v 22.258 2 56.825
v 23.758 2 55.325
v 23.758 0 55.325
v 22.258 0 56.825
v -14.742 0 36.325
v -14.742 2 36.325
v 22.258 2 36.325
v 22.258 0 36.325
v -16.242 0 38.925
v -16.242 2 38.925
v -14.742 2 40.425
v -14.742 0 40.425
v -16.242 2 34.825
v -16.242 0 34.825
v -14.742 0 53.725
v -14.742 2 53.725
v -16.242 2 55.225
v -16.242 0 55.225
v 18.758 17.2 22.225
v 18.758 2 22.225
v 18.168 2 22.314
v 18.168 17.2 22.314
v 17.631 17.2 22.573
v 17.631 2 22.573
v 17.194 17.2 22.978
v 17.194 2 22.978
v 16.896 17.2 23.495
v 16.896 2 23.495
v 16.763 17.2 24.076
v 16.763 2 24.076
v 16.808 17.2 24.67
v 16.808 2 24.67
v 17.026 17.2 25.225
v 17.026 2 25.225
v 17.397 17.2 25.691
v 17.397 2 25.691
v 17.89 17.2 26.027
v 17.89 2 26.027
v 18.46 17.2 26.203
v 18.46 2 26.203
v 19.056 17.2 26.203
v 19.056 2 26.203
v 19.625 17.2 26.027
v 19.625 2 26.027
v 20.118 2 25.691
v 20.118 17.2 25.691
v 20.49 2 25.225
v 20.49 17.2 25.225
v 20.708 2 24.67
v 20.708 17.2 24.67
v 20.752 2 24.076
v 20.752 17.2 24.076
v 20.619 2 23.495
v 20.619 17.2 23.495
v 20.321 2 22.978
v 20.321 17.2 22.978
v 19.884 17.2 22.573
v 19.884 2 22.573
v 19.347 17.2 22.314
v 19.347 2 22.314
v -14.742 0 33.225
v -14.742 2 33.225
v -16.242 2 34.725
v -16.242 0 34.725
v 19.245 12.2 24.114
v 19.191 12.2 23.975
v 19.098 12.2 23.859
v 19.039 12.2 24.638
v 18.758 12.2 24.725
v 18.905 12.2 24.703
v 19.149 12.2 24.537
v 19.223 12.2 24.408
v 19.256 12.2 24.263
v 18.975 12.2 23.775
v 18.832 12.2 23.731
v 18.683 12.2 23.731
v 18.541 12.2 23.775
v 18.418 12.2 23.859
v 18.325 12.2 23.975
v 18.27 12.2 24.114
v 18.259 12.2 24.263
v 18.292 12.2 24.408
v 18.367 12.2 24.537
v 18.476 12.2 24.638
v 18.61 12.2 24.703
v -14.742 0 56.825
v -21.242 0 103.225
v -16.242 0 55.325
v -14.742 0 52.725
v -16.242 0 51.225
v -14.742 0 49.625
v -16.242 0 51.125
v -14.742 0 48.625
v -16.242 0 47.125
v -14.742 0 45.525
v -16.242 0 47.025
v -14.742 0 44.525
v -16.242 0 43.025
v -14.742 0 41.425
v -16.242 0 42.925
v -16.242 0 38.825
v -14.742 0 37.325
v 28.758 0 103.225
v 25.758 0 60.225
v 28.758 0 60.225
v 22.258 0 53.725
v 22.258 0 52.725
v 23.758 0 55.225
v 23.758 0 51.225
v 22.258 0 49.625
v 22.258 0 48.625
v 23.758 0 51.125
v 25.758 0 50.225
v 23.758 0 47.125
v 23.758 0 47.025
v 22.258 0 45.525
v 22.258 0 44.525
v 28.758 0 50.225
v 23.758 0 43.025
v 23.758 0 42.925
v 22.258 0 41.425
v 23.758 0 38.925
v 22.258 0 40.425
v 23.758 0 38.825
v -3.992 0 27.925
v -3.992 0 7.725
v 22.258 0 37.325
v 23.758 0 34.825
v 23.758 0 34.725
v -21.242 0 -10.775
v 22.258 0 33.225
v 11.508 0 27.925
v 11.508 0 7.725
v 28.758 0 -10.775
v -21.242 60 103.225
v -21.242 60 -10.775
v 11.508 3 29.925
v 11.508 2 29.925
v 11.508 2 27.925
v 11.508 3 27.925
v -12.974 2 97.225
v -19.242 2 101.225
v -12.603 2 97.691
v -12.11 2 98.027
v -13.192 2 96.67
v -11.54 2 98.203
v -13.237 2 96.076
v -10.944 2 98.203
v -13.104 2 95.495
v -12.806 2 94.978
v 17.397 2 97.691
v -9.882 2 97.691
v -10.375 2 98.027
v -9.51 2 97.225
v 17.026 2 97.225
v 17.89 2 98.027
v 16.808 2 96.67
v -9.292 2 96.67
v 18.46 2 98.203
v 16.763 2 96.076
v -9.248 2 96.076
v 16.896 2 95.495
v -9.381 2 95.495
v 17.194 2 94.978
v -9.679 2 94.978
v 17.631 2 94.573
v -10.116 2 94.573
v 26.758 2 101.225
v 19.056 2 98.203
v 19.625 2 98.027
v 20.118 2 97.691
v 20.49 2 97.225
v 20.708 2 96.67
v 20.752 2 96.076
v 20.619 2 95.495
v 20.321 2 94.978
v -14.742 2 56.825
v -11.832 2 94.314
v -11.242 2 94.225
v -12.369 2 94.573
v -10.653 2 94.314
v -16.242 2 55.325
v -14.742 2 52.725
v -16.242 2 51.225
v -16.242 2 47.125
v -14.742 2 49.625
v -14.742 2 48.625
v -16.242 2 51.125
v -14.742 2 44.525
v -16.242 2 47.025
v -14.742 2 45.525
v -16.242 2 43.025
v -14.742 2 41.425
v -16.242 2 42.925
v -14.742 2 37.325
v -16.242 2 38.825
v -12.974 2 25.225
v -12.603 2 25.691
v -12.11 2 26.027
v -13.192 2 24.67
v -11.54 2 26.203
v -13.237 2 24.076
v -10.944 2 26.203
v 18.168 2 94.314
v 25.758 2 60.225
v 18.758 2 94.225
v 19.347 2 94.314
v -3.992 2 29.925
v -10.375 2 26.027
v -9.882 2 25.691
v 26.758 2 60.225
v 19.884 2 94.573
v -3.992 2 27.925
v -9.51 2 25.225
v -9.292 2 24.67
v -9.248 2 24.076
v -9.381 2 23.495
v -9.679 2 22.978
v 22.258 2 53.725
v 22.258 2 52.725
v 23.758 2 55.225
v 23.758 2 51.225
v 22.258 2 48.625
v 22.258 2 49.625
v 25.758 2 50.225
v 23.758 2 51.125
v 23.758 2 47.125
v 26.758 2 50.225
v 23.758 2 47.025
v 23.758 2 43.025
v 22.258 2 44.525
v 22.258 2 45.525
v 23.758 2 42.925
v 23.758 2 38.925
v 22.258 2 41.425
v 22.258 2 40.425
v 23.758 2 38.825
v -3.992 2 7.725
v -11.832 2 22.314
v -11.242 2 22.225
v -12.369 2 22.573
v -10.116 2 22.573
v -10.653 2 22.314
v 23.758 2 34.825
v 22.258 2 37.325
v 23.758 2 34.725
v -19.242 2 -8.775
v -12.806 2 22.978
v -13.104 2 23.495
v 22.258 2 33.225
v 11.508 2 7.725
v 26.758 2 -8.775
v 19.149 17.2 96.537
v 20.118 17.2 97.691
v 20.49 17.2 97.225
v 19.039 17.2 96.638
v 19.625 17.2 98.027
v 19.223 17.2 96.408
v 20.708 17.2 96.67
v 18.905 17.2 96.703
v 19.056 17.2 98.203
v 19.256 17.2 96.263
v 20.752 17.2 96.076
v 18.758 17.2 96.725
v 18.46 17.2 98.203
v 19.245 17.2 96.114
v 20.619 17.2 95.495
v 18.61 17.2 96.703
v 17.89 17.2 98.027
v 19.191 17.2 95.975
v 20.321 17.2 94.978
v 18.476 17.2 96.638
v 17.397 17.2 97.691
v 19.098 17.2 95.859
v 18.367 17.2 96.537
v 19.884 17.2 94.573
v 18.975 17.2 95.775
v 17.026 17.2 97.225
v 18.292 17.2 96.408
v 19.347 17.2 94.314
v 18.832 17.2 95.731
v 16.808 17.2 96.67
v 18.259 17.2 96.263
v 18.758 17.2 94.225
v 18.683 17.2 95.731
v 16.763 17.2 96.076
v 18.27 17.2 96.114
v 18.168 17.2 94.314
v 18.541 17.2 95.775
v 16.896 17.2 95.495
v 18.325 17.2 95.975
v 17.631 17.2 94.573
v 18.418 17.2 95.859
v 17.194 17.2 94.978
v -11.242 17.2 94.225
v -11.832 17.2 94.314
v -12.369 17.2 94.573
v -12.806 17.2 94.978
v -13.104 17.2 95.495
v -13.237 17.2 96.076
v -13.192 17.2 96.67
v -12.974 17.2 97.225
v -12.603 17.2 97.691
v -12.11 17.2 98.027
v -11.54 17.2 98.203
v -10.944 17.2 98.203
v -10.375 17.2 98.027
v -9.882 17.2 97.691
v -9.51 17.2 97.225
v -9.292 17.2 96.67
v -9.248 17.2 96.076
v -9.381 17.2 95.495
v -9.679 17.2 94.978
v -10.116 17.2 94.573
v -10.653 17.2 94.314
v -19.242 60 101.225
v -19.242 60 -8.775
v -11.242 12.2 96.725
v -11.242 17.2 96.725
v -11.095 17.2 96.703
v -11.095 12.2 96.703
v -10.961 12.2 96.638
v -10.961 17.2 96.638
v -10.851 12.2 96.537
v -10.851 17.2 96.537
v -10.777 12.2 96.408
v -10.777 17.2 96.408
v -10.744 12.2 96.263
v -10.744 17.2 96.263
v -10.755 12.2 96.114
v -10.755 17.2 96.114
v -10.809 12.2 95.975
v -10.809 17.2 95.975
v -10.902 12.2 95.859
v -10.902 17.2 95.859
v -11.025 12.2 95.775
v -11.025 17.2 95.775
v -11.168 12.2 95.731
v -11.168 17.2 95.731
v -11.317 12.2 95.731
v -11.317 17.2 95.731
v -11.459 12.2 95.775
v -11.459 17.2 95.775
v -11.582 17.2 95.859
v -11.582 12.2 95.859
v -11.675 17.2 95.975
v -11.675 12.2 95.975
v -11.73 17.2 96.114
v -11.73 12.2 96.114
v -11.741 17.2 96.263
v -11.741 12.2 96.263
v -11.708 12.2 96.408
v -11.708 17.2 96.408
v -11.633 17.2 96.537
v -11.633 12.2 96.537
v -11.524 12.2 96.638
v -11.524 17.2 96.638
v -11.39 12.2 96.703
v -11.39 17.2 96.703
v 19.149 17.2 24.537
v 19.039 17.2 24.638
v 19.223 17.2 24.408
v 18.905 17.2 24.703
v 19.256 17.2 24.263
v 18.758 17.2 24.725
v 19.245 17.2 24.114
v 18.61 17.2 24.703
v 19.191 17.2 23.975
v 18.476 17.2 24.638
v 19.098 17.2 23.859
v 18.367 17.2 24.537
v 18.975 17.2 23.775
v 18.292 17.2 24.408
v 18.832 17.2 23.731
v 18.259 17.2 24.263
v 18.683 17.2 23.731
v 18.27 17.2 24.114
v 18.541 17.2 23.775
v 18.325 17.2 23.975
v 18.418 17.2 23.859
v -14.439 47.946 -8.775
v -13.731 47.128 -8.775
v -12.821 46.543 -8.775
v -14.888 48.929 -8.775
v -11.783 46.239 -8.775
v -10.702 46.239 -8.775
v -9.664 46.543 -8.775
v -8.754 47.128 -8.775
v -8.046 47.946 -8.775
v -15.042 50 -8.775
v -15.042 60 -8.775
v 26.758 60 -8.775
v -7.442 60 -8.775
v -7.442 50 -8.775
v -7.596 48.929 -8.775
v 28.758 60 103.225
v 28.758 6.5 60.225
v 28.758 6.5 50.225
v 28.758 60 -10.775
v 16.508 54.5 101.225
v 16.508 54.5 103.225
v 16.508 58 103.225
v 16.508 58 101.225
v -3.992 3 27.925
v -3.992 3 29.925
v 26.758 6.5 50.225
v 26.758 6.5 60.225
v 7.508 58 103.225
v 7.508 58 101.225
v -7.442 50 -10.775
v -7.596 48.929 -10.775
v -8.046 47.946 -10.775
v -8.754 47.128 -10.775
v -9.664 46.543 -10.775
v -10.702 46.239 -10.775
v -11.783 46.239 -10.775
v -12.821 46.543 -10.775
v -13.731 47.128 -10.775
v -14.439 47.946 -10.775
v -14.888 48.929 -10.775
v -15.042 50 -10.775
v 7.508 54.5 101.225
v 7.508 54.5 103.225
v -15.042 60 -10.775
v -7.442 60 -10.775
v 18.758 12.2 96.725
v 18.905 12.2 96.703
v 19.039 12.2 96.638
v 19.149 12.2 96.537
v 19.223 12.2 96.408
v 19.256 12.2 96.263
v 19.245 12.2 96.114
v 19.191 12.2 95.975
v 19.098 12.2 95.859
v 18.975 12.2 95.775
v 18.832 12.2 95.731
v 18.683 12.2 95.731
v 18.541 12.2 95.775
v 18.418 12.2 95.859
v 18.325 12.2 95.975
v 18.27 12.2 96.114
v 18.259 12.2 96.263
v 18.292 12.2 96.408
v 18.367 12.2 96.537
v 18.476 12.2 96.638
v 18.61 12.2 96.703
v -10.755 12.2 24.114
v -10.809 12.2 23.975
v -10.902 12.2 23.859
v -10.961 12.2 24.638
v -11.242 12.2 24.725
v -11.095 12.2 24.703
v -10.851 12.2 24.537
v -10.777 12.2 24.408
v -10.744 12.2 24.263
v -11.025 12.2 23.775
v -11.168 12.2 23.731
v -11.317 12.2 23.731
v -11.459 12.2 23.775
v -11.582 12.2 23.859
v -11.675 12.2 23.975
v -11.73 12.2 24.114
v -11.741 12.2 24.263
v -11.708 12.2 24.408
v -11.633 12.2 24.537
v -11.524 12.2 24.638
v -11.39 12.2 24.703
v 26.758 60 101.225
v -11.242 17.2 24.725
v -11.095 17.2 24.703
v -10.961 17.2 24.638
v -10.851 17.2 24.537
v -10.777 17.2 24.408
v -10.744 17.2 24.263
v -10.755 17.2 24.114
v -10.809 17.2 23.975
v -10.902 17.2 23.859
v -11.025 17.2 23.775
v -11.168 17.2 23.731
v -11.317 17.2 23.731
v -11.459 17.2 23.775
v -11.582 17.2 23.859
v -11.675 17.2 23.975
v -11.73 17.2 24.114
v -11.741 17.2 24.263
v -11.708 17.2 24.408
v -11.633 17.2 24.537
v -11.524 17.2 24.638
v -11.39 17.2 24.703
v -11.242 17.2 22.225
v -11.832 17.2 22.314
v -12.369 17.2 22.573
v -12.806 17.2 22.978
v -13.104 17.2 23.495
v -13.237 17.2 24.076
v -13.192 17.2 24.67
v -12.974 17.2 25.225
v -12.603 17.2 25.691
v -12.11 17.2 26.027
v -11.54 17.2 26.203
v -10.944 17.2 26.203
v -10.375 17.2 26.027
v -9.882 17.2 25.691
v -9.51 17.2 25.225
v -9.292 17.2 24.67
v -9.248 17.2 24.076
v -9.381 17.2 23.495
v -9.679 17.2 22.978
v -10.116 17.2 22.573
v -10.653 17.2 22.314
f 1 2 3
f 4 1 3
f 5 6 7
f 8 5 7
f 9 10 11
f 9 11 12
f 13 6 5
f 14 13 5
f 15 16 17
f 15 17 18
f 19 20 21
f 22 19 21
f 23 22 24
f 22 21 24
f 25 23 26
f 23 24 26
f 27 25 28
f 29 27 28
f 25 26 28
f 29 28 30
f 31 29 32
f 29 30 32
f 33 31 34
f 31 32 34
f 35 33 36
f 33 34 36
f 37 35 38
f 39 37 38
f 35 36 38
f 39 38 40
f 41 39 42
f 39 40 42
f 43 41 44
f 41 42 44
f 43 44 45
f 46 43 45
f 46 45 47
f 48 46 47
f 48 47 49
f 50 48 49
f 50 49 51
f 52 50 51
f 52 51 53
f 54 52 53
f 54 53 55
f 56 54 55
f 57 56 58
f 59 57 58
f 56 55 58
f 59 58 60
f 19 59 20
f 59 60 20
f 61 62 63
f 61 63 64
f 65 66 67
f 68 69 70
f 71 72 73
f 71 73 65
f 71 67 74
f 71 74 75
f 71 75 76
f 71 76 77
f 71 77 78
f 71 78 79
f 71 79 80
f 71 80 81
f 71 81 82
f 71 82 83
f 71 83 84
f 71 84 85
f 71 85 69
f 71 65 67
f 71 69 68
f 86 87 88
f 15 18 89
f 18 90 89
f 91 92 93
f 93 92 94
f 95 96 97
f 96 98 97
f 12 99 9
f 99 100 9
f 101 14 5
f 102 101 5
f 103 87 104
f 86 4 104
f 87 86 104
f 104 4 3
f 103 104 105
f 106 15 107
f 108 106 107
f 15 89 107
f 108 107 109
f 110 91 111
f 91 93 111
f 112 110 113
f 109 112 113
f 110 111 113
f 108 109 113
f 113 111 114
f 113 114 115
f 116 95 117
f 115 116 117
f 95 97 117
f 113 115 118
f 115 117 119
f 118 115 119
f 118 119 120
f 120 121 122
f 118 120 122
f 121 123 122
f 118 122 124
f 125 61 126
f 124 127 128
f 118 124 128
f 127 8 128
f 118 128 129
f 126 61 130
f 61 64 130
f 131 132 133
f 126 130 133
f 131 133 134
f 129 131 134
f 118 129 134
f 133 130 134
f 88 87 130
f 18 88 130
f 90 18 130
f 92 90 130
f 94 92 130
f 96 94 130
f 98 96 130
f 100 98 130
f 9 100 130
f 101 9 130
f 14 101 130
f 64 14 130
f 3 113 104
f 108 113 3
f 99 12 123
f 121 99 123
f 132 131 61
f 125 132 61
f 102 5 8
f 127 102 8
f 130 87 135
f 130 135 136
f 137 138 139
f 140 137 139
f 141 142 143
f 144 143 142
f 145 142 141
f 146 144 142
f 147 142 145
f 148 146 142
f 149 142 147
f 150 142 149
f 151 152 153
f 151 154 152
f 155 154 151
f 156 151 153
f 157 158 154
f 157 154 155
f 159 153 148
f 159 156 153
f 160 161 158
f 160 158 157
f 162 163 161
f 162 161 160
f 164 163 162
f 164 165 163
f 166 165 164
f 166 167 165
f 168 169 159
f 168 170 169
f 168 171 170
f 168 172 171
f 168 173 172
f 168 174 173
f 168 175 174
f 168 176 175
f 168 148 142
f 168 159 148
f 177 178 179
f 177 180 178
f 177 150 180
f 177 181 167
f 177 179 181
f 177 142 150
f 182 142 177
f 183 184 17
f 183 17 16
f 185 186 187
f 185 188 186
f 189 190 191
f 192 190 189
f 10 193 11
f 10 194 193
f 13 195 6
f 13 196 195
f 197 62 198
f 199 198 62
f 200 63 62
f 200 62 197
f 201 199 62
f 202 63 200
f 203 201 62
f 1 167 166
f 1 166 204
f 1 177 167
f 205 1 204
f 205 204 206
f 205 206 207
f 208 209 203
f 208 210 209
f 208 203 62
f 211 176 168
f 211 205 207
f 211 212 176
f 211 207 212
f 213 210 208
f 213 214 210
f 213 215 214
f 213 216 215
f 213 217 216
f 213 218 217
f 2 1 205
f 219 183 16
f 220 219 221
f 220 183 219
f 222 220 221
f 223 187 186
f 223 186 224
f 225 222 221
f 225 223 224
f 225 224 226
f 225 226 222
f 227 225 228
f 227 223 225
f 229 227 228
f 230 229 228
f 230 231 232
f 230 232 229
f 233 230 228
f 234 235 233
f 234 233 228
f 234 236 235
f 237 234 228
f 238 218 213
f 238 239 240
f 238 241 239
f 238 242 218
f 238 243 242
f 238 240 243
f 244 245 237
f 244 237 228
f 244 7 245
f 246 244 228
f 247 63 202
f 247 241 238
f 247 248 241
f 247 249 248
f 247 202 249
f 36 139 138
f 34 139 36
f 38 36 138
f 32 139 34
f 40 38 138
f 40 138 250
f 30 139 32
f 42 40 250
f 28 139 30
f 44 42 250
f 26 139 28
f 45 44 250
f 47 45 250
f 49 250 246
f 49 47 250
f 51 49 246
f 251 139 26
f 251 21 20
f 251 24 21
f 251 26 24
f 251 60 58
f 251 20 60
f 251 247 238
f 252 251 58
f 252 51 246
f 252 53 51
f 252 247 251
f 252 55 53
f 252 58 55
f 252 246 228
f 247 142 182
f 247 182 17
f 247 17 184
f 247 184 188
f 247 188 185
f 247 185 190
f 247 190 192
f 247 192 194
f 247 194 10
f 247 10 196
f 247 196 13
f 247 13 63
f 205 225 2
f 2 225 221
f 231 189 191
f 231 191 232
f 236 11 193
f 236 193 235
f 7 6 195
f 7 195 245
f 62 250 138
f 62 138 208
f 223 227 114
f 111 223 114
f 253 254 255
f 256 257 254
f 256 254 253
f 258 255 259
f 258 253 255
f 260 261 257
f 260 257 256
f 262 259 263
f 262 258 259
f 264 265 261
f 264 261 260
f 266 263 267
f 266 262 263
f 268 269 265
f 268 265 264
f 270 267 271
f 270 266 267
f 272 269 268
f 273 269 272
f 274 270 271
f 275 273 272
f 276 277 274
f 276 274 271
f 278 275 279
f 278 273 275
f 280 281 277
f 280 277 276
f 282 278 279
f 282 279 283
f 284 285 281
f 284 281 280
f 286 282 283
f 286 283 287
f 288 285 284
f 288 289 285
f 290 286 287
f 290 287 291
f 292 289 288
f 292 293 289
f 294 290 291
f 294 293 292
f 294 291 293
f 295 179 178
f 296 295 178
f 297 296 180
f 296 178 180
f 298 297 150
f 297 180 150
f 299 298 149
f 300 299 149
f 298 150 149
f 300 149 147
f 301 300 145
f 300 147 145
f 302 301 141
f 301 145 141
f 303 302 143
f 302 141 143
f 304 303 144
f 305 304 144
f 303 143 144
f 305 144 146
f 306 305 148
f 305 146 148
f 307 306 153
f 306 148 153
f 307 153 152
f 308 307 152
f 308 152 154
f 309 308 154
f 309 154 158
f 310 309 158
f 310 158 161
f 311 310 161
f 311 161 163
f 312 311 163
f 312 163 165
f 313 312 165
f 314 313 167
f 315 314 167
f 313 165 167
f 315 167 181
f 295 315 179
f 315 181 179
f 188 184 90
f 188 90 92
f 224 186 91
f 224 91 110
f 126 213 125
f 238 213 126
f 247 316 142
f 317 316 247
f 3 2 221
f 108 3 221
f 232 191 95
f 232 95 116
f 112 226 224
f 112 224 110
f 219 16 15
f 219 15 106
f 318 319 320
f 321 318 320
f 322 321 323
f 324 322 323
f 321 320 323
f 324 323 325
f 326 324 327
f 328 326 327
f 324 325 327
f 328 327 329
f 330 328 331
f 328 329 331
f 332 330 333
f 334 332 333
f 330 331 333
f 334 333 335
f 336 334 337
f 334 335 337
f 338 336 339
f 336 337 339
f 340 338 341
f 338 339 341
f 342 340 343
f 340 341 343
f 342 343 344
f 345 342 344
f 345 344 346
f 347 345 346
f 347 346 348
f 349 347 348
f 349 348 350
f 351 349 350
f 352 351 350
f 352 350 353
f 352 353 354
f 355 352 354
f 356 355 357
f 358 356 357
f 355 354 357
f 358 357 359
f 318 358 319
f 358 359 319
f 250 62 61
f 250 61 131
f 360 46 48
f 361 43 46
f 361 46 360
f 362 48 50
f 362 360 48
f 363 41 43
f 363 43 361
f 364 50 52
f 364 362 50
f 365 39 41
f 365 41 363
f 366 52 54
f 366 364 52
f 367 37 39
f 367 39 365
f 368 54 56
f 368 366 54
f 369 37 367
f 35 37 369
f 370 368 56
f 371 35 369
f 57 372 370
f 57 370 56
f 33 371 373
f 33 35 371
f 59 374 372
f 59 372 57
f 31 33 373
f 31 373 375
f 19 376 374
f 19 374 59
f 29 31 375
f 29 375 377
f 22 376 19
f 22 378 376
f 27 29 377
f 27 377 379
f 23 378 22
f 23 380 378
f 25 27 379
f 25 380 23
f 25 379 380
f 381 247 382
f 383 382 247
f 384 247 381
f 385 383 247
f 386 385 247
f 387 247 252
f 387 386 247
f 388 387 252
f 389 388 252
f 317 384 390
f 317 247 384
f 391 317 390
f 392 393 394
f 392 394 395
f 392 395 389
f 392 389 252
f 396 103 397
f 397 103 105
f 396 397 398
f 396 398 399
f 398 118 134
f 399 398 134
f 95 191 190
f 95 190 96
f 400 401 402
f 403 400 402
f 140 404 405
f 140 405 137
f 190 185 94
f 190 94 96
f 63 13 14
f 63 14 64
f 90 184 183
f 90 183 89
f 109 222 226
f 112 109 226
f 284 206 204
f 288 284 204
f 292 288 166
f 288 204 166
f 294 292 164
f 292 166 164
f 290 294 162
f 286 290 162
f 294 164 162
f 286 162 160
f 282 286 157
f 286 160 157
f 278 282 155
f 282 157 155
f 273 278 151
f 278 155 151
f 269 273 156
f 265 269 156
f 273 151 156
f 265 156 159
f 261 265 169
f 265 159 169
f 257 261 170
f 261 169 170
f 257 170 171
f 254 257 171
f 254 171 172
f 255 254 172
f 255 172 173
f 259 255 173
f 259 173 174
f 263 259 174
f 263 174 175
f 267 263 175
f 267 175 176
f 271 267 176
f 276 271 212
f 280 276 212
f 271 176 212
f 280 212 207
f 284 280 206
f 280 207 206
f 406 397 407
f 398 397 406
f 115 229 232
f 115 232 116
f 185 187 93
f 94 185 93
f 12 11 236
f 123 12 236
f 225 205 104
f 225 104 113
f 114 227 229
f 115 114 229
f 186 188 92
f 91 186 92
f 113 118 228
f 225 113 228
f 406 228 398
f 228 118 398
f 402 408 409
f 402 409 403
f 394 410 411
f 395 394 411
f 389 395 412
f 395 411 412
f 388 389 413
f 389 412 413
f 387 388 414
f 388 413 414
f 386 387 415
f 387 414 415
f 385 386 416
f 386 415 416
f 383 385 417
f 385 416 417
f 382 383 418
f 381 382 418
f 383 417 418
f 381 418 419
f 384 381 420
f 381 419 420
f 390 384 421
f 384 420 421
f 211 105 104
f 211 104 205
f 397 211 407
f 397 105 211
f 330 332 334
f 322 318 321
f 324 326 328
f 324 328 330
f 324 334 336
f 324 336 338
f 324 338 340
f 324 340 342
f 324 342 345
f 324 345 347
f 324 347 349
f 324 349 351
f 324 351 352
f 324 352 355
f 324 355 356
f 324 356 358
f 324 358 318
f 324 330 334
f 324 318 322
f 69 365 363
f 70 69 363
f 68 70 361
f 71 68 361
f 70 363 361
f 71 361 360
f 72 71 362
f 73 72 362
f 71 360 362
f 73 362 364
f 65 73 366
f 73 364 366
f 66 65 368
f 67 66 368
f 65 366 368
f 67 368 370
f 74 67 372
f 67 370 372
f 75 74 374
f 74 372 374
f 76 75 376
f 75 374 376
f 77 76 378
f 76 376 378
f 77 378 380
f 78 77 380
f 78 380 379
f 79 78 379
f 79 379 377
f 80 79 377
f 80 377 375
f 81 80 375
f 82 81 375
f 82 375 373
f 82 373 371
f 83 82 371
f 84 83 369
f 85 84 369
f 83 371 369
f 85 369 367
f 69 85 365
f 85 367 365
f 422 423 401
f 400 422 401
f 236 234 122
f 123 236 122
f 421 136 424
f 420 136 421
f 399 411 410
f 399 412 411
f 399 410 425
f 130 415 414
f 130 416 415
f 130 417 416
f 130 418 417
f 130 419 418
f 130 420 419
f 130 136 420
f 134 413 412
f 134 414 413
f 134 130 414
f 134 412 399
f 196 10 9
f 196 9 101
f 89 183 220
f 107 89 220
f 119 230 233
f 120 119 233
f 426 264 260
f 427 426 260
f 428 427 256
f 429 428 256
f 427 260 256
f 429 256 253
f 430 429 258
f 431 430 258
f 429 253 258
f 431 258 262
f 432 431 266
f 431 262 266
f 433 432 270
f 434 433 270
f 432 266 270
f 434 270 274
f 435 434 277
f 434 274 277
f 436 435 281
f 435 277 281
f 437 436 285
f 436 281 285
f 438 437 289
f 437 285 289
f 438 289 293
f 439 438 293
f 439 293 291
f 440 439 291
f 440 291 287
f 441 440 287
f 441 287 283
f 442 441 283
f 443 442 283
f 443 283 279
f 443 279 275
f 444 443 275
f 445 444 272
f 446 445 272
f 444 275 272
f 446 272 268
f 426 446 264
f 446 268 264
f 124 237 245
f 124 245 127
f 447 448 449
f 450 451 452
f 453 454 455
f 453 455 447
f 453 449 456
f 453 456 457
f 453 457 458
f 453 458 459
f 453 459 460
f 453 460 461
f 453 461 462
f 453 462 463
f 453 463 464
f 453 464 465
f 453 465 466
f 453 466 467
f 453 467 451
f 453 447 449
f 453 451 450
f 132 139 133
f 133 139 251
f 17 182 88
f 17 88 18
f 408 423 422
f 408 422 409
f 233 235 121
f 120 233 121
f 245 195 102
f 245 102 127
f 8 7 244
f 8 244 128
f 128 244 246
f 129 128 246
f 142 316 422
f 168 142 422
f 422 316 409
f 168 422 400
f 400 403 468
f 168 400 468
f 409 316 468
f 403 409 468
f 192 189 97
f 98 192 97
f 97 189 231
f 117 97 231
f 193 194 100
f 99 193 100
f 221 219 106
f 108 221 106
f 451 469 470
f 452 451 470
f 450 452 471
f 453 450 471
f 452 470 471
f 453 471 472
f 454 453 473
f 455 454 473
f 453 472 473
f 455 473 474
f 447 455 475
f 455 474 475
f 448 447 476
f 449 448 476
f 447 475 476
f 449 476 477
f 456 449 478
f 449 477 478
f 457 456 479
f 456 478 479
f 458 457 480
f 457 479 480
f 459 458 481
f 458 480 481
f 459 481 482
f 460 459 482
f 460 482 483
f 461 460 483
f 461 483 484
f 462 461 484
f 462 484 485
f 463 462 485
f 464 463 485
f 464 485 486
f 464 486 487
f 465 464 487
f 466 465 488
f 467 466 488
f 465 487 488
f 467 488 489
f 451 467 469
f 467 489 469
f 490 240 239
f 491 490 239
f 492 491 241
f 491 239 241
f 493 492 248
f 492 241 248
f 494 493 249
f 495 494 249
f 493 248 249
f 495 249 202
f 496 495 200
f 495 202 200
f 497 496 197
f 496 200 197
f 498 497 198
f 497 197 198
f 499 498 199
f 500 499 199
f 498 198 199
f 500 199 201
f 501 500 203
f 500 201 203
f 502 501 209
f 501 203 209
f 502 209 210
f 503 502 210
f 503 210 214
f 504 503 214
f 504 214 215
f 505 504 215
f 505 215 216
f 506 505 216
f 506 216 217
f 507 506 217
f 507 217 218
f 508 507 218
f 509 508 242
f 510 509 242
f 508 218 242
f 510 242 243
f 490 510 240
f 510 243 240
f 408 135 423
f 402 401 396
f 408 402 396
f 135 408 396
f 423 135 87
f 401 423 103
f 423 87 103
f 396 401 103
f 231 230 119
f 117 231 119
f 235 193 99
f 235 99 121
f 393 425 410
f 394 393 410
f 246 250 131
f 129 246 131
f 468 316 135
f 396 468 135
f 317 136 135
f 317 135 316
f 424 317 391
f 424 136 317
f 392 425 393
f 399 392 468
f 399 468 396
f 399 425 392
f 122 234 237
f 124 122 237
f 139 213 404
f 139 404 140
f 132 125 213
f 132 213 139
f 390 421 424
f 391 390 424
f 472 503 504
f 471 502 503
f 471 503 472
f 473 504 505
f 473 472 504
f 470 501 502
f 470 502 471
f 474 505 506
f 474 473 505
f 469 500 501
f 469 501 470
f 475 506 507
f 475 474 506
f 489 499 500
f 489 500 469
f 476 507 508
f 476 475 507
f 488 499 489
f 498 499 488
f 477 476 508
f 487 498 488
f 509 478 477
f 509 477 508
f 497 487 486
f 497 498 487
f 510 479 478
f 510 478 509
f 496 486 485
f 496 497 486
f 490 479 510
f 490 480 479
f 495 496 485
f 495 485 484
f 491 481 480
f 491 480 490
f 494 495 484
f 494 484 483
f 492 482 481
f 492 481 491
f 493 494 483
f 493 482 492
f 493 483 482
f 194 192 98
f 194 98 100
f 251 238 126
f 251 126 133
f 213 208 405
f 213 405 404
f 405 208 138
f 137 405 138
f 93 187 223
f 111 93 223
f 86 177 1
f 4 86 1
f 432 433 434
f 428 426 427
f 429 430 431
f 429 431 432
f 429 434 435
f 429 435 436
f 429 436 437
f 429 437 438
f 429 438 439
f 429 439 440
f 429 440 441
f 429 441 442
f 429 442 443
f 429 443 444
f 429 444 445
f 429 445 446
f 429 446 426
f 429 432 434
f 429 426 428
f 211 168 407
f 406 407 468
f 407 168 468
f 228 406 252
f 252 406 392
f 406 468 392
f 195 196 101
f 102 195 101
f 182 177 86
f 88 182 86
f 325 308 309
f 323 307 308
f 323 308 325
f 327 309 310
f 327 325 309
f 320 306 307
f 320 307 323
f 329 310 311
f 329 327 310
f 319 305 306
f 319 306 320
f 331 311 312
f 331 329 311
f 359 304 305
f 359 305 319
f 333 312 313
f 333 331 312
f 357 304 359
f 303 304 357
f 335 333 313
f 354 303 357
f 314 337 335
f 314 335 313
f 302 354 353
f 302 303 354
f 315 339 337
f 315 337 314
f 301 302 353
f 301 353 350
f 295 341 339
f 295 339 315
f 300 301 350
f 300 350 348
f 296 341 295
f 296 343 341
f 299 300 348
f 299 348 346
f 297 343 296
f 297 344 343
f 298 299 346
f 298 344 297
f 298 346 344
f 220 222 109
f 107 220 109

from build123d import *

# Parameters (mm, degrees)
SKIZZE1_W                       = 50
SKIZZE1_H                       = 114
AUFSATZ_LINEAR_AUSTRAGEN1_DEPTH = 60
SKIZZE2_W                       = 46
SKIZZE2_H                       = 110
SCHNITT_LINEAR_AUSTRAGEN1_DEPTH = 58
SKIZZE3_R                       = 2
AUFSATZ_LINEAR_AUSTRAGEN2_DEPTH = 15.2
SKIZZE4_R                       = 0.5
SCHNITT_LINEAR_AUSTRAGEN2_DEPTH = 5
SCHNITT_LINEAR_AUSTRAGEN3_REACH = 123.846
SKIZZE5_W                       = 15.5
SKIZZE5_H                       = 20.2
SKIZZE6_W                       = 15.5
SKIZZE6_H                       = 2
AUFSATZ_LINEAR_AUSTRAGEN3_DEPTH = 1
SCHNITT_LINEAR_AUSTRAGEN4_REACH = 123.846
SKIZZE7_W                       = 40
SKIZZE7_H                       = 3.1
FASE1_SIZE                      = 1.5
SKIZZE8_W                       = 10
SKIZZE8_H                       = 6.5
SCHNITT_LINEAR_AUSTRAGEN5_DEPTH = 3
SCHNITT_LINEAR_AUSTRAGEN6_REACH = 133.996
SKIZZE9_R                       = 3.8
SCHNITT_LINEAR_AUSTRAGEN7_REACH = 133.996
SKIZZE10_W                      = 9
SKIZZE10_H                      = 3.5


with BuildPart() as part:
    # Skizze1 → Aufsatz-Linear austragen1 (new body)
    with BuildSketch(Plane(origin=(0, 0, 0), x_dir=(1, 0, 0), z_dir=(0, 1, 0))):
        with Locations((3.757679181, -46.225255973)):
            Rectangle(SKIZZE1_W, SKIZZE1_H)
    extrude(amount=AUFSATZ_LINEAR_AUSTRAGEN1_DEPTH)

    # Skizze2 → Schnitt-Linear austragen1 (cut)
    with BuildSketch(Plane(origin=(0, 60, 0), x_dir=(1, 0, 0), z_dir=(0, 1, 0))):
        with Locations((3.757679181, -46.225255973)):
            Rectangle(SKIZZE2_W, SKIZZE2_H)
    extrude(amount=-SCHNITT_LINEAR_AUSTRAGEN1_DEPTH, mode=Mode.SUBTRACT)

    # Skizze3 → Aufsatz-Linear austragen2 (add)
    with BuildSketch(Plane(origin=(0, 2, 0), x_dir=(1, 0, 0), z_dir=(0, 1, 0))):
        with Locations(Location((-11.242320819, -24.225255973, 0), (0, 0, 90))):
            Circle(SKIZZE3_R)
        with Locations(Location((18.757679181, -24.225255973, 0), (0, 0, 90))):
            Circle(SKIZZE3_R)
        with Locations(Location((18.757679181, -96.225255973, 0), (0, 0, 90))):
            Circle(SKIZZE3_R)
        with Locations(Location((-11.242320819, -96.225255973, 0), (0, 0, 90))):
            Circle(SKIZZE3_R)
    extrude(amount=AUFSATZ_LINEAR_AUSTRAGEN2_DEPTH)

    # Skizze4 → Schnitt-Linear austragen2 (cut)
    with BuildSketch(Plane(origin=(0, 17.2, 0), x_dir=(1, 0, 0), z_dir=(0, 1, 0))):
        with Locations(Location((-11.242320819, -24.225255973, 0), (0, 0, 270))):
            Circle(SKIZZE4_R)
        with Locations(Location((18.757679181, -24.225255973, 0), (0, 0, 270))):
            Circle(SKIZZE4_R)
        with Locations(Location((18.757679181, -96.225255973, 0), (0, 0, 270))):
            Circle(SKIZZE4_R)
        with Locations(Location((-11.242320819, -96.225255973, 0), (0, 0, 270))):
            Circle(SKIZZE4_R)
    extrude(amount=-SCHNITT_LINEAR_AUSTRAGEN2_DEPTH, mode=Mode.SUBTRACT)

    # Skizze5 → Schnitt-Linear austragen3 (cut, up to next)
    with BuildSketch(Plane(origin=(0, 2, 0), x_dir=(1, 0, 0), z_dir=(0, 1, 0)), mode=Mode.PRIVATE) as schnitt_linear_austragen3_sk1:
        with Locations((3.757679181, -17.825255973)):
            Rectangle(SKIZZE5_W, SKIZZE5_H)
    schnitt_linear_austragen3_tool1 = extrude(schnitt_linear_austragen3_sk1.sketch, amount=-SCHNITT_LINEAR_AUSTRAGEN3_REACH, mode=Mode.PRIVATE) & part.part
    add(schnitt_linear_austragen3_tool1.solids().sort_by_distance((3.757679, 2, 17.825256))[0], mode=Mode.SUBTRACT)

    # Skizze6 → Aufsatz-Linear austragen3 (add)
    with BuildSketch(Plane(origin=(0, 2, 0), x_dir=(1, 0, 0), z_dir=(0, 1, 0))):
        with Locations((3.757679181, -28.925255973)):
            Rectangle(SKIZZE6_W, SKIZZE6_H)
    extrude(amount=AUFSATZ_LINEAR_AUSTRAGEN3_DEPTH)

    # Skizze7 → Schnitt-Linear austragen4 (cut, up to next)
    with BuildSketch(Plane(origin=(0, 2, 0), x_dir=(1, 0, 0), z_dir=(0, 1, 0)), mode=Mode.PRIVATE) as schnitt_linear_austragen4_sk1:
        with Locations((3.757679181, -34.775255973)):
            Rectangle(SKIZZE7_W, SKIZZE7_H)
    schnitt_linear_austragen4_tool1 = extrude(schnitt_linear_austragen4_sk1.sketch, amount=-SCHNITT_LINEAR_AUSTRAGEN4_REACH, mode=Mode.PRIVATE) & part.part
    # Skizze7 → Schnitt-Linear austragen4 (cut, up to next)
    with BuildSketch(Plane(origin=(0, 2, 0), x_dir=(1, 0, 0), z_dir=(0, 1, 0)), mode=Mode.PRIVATE) as schnitt_linear_austragen4_sk2:
        with Locations((3.757679181, -38.875255973)):
            Rectangle(SKIZZE7_W, SKIZZE7_H)
    schnitt_linear_austragen4_tool2 = extrude(schnitt_linear_austragen4_sk2.sketch, amount=-SCHNITT_LINEAR_AUSTRAGEN4_REACH, mode=Mode.PRIVATE) & part.part
    # Skizze7 → Schnitt-Linear austragen4 (cut, up to next)
    with BuildSketch(Plane(origin=(0, 2, 0), x_dir=(1, 0, 0), z_dir=(0, 1, 0)), mode=Mode.PRIVATE) as schnitt_linear_austragen4_sk3:
        with Locations((3.757679181, -42.975255973)):
            Rectangle(SKIZZE7_W, SKIZZE7_H)
    schnitt_linear_austragen4_tool3 = extrude(schnitt_linear_austragen4_sk3.sketch, amount=-SCHNITT_LINEAR_AUSTRAGEN4_REACH, mode=Mode.PRIVATE) & part.part
    # Skizze7 → Schnitt-Linear austragen4 (cut, up to next)
    with BuildSketch(Plane(origin=(0, 2, 0), x_dir=(1, 0, 0), z_dir=(0, 1, 0)), mode=Mode.PRIVATE) as schnitt_linear_austragen4_sk4:
        with Locations((3.757679181, -47.075255973)):
            Rectangle(SKIZZE7_W, SKIZZE7_H)
    schnitt_linear_austragen4_tool4 = extrude(schnitt_linear_austragen4_sk4.sketch, amount=-SCHNITT_LINEAR_AUSTRAGEN4_REACH, mode=Mode.PRIVATE) & part.part
    # Skizze7 → Schnitt-Linear austragen4 (cut, up to next)
    with BuildSketch(Plane(origin=(0, 2, 0), x_dir=(1, 0, 0), z_dir=(0, 1, 0)), mode=Mode.PRIVATE) as schnitt_linear_austragen4_sk5:
        with Locations((3.757679181, -51.175255973)):
            Rectangle(SKIZZE7_W, SKIZZE7_H)
    schnitt_linear_austragen4_tool5 = extrude(schnitt_linear_austragen4_sk5.sketch, amount=-SCHNITT_LINEAR_AUSTRAGEN4_REACH, mode=Mode.PRIVATE) & part.part
    # Skizze7 → Schnitt-Linear austragen4 (cut, up to next)
    with BuildSketch(Plane(origin=(0, 2, 0), x_dir=(1, 0, 0), z_dir=(0, 1, 0)), mode=Mode.PRIVATE) as schnitt_linear_austragen4_sk6:
        with Locations((3.757679181, -55.275255973)):
            Rectangle(SKIZZE7_W, SKIZZE7_H)
    schnitt_linear_austragen4_tool6 = extrude(schnitt_linear_austragen4_sk6.sketch, amount=-SCHNITT_LINEAR_AUSTRAGEN4_REACH, mode=Mode.PRIVATE) & part.part
    add(schnitt_linear_austragen4_tool1.solids().sort_by_distance((3.757679, 2, 34.775256))[0], mode=Mode.SUBTRACT)
    add(schnitt_linear_austragen4_tool2.solids().sort_by_distance((3.757679, 2, 38.875256))[0], mode=Mode.SUBTRACT)
    add(schnitt_linear_austragen4_tool3.solids().sort_by_distance((3.757679, 2, 42.975256))[0], mode=Mode.SUBTRACT)
    add(schnitt_linear_austragen4_tool4.solids().sort_by_distance((3.757679, 2, 47.075256))[0], mode=Mode.SUBTRACT)
    add(schnitt_linear_austragen4_tool5.solids().sort_by_distance((3.757679, 2, 51.175256))[0], mode=Mode.SUBTRACT)
    add(schnitt_linear_austragen4_tool6.solids().sort_by_distance((3.757679, 2, 55.275256))[0], mode=Mode.SUBTRACT)

    # Fase1
    fase1_edges = [part.edges().sort_by_distance(p)[0] for p in [
        (-16.242320819, 1, 36.325255973),
        (-16.242320819, 1, 33.225255973),
        (23.757679181, 1, 33.225255973),
        (23.757679181, 1, 36.325255973),
        (-16.242320819, 1, 37.325255973),
        (23.757679181, 1, 37.325255973),
        (23.757679181, 1, 40.425255973),
        (-16.242320819, 1, 40.425255973),
        (-16.242320819, 1, 41.425255973),
        (23.757679181, 1, 41.425255973),
        (23.757679181, 1, 44.525255973),
        (-16.242320819, 1, 44.525255973),
        (-16.242320819, 1, 45.525255973),
        (23.757679181, 1, 45.525255973),
        (23.757679181, 1, 48.625255973),
        (-16.242320819, 1, 48.625255973),
        (-16.242320819, 1, 49.625255973),
        (23.757679181, 1, 49.625255973),
        (23.757679181, 1, 52.725255973),
        (-16.242320819, 1, 52.725255973),
        (-16.242320819, 1, 53.725255973),
        (23.757679181, 1, 53.725255973),
        (23.757679181, 1, 56.825255973),
        (-16.242320819, 1, 56.825255973),
    ]]
    chamfer(fase1_edges, length=FASE1_SIZE)

    # Skizze8 → Schnitt-Linear austragen5 (cut)
    with BuildSketch(Plane(origin=(28.757679181, 0, 0), x_dir=(0, 0, -1), z_dir=(1, 0, 0))):
        with Locations((-55.225255973, 3.25)):
            Rectangle(SKIZZE8_W, SKIZZE8_H)
    extrude(amount=-SCHNITT_LINEAR_AUSTRAGEN5_DEPTH, mode=Mode.SUBTRACT)

    # Skizze9 → Schnitt-Linear austragen6 (cut, up to next)
    with BuildSketch(Plane(origin=(0, 0, -10.774744027), x_dir=(-1, 0, 0), z_dir=(0, 0, -1)), mode=Mode.PRIVATE) as schnitt_linear_austragen6_sk1:
        with BuildLine():
            Line((7.442320819, 60), (7.442320819, 50))
            ThreePointArc((7.442320819, 50), (11.242320819, 53.8), (15.042320819, 50))
            Line((15.042320819, 50), (15.042320819, 60))
            Line((15.042320819, 60), (7.442320819, 60))
        make_face()
    schnitt_linear_austragen6_tool1 = extrude(schnitt_linear_austragen6_sk1.sketch, amount=-SCHNITT_LINEAR_AUSTRAGEN6_REACH, mode=Mode.PRIVATE) & part.part
    # Skizze9 → Schnitt-Linear austragen6 (cut, up to next)
    with BuildSketch(Plane(origin=(0, 0, -10.774744027), x_dir=(-1, 0, 0), z_dir=(0, 0, -1)), mode=Mode.PRIVATE) as schnitt_linear_austragen6_sk2:
        with Locations((11.242320819, 50)):
            Circle(SKIZZE9_R)
    schnitt_linear_austragen6_tool2 = extrude(schnitt_linear_austragen6_sk2.sketch, amount=-SCHNITT_LINEAR_AUSTRAGEN6_REACH, mode=Mode.PRIVATE) & part.part
    add(schnitt_linear_austragen6_tool1.solids().sort_by_distance((-11.242321, 56.440988, -10.774744))[0], mode=Mode.SUBTRACT)
    add(schnitt_linear_austragen6_tool2.solids().sort_by_distance((-11.242321, 50, -10.774744))[0], mode=Mode.SUBTRACT)

    # Skizze10 → Schnitt-Linear austragen7 (cut, up to next)
    with BuildSketch(Plane.XY.offset(103.225255973), mode=Mode.PRIVATE) as schnitt_linear_austragen7_sk1:
        with Locations((12.007679181, 56.25)):
            Rectangle(SKIZZE10_W, SKIZZE10_H)
    schnitt_linear_austragen7_tool1 = extrude(schnitt_linear_austragen7_sk1.sketch, amount=-SCHNITT_LINEAR_AUSTRAGEN7_REACH, mode=Mode.PRIVATE) & part.part
    add(schnitt_linear_austragen7_tool1.solids().sort_by_distance((12.007679, 56.25, 103.225256))[0], mode=Mode.SUBTRACT)


solid = part.part
